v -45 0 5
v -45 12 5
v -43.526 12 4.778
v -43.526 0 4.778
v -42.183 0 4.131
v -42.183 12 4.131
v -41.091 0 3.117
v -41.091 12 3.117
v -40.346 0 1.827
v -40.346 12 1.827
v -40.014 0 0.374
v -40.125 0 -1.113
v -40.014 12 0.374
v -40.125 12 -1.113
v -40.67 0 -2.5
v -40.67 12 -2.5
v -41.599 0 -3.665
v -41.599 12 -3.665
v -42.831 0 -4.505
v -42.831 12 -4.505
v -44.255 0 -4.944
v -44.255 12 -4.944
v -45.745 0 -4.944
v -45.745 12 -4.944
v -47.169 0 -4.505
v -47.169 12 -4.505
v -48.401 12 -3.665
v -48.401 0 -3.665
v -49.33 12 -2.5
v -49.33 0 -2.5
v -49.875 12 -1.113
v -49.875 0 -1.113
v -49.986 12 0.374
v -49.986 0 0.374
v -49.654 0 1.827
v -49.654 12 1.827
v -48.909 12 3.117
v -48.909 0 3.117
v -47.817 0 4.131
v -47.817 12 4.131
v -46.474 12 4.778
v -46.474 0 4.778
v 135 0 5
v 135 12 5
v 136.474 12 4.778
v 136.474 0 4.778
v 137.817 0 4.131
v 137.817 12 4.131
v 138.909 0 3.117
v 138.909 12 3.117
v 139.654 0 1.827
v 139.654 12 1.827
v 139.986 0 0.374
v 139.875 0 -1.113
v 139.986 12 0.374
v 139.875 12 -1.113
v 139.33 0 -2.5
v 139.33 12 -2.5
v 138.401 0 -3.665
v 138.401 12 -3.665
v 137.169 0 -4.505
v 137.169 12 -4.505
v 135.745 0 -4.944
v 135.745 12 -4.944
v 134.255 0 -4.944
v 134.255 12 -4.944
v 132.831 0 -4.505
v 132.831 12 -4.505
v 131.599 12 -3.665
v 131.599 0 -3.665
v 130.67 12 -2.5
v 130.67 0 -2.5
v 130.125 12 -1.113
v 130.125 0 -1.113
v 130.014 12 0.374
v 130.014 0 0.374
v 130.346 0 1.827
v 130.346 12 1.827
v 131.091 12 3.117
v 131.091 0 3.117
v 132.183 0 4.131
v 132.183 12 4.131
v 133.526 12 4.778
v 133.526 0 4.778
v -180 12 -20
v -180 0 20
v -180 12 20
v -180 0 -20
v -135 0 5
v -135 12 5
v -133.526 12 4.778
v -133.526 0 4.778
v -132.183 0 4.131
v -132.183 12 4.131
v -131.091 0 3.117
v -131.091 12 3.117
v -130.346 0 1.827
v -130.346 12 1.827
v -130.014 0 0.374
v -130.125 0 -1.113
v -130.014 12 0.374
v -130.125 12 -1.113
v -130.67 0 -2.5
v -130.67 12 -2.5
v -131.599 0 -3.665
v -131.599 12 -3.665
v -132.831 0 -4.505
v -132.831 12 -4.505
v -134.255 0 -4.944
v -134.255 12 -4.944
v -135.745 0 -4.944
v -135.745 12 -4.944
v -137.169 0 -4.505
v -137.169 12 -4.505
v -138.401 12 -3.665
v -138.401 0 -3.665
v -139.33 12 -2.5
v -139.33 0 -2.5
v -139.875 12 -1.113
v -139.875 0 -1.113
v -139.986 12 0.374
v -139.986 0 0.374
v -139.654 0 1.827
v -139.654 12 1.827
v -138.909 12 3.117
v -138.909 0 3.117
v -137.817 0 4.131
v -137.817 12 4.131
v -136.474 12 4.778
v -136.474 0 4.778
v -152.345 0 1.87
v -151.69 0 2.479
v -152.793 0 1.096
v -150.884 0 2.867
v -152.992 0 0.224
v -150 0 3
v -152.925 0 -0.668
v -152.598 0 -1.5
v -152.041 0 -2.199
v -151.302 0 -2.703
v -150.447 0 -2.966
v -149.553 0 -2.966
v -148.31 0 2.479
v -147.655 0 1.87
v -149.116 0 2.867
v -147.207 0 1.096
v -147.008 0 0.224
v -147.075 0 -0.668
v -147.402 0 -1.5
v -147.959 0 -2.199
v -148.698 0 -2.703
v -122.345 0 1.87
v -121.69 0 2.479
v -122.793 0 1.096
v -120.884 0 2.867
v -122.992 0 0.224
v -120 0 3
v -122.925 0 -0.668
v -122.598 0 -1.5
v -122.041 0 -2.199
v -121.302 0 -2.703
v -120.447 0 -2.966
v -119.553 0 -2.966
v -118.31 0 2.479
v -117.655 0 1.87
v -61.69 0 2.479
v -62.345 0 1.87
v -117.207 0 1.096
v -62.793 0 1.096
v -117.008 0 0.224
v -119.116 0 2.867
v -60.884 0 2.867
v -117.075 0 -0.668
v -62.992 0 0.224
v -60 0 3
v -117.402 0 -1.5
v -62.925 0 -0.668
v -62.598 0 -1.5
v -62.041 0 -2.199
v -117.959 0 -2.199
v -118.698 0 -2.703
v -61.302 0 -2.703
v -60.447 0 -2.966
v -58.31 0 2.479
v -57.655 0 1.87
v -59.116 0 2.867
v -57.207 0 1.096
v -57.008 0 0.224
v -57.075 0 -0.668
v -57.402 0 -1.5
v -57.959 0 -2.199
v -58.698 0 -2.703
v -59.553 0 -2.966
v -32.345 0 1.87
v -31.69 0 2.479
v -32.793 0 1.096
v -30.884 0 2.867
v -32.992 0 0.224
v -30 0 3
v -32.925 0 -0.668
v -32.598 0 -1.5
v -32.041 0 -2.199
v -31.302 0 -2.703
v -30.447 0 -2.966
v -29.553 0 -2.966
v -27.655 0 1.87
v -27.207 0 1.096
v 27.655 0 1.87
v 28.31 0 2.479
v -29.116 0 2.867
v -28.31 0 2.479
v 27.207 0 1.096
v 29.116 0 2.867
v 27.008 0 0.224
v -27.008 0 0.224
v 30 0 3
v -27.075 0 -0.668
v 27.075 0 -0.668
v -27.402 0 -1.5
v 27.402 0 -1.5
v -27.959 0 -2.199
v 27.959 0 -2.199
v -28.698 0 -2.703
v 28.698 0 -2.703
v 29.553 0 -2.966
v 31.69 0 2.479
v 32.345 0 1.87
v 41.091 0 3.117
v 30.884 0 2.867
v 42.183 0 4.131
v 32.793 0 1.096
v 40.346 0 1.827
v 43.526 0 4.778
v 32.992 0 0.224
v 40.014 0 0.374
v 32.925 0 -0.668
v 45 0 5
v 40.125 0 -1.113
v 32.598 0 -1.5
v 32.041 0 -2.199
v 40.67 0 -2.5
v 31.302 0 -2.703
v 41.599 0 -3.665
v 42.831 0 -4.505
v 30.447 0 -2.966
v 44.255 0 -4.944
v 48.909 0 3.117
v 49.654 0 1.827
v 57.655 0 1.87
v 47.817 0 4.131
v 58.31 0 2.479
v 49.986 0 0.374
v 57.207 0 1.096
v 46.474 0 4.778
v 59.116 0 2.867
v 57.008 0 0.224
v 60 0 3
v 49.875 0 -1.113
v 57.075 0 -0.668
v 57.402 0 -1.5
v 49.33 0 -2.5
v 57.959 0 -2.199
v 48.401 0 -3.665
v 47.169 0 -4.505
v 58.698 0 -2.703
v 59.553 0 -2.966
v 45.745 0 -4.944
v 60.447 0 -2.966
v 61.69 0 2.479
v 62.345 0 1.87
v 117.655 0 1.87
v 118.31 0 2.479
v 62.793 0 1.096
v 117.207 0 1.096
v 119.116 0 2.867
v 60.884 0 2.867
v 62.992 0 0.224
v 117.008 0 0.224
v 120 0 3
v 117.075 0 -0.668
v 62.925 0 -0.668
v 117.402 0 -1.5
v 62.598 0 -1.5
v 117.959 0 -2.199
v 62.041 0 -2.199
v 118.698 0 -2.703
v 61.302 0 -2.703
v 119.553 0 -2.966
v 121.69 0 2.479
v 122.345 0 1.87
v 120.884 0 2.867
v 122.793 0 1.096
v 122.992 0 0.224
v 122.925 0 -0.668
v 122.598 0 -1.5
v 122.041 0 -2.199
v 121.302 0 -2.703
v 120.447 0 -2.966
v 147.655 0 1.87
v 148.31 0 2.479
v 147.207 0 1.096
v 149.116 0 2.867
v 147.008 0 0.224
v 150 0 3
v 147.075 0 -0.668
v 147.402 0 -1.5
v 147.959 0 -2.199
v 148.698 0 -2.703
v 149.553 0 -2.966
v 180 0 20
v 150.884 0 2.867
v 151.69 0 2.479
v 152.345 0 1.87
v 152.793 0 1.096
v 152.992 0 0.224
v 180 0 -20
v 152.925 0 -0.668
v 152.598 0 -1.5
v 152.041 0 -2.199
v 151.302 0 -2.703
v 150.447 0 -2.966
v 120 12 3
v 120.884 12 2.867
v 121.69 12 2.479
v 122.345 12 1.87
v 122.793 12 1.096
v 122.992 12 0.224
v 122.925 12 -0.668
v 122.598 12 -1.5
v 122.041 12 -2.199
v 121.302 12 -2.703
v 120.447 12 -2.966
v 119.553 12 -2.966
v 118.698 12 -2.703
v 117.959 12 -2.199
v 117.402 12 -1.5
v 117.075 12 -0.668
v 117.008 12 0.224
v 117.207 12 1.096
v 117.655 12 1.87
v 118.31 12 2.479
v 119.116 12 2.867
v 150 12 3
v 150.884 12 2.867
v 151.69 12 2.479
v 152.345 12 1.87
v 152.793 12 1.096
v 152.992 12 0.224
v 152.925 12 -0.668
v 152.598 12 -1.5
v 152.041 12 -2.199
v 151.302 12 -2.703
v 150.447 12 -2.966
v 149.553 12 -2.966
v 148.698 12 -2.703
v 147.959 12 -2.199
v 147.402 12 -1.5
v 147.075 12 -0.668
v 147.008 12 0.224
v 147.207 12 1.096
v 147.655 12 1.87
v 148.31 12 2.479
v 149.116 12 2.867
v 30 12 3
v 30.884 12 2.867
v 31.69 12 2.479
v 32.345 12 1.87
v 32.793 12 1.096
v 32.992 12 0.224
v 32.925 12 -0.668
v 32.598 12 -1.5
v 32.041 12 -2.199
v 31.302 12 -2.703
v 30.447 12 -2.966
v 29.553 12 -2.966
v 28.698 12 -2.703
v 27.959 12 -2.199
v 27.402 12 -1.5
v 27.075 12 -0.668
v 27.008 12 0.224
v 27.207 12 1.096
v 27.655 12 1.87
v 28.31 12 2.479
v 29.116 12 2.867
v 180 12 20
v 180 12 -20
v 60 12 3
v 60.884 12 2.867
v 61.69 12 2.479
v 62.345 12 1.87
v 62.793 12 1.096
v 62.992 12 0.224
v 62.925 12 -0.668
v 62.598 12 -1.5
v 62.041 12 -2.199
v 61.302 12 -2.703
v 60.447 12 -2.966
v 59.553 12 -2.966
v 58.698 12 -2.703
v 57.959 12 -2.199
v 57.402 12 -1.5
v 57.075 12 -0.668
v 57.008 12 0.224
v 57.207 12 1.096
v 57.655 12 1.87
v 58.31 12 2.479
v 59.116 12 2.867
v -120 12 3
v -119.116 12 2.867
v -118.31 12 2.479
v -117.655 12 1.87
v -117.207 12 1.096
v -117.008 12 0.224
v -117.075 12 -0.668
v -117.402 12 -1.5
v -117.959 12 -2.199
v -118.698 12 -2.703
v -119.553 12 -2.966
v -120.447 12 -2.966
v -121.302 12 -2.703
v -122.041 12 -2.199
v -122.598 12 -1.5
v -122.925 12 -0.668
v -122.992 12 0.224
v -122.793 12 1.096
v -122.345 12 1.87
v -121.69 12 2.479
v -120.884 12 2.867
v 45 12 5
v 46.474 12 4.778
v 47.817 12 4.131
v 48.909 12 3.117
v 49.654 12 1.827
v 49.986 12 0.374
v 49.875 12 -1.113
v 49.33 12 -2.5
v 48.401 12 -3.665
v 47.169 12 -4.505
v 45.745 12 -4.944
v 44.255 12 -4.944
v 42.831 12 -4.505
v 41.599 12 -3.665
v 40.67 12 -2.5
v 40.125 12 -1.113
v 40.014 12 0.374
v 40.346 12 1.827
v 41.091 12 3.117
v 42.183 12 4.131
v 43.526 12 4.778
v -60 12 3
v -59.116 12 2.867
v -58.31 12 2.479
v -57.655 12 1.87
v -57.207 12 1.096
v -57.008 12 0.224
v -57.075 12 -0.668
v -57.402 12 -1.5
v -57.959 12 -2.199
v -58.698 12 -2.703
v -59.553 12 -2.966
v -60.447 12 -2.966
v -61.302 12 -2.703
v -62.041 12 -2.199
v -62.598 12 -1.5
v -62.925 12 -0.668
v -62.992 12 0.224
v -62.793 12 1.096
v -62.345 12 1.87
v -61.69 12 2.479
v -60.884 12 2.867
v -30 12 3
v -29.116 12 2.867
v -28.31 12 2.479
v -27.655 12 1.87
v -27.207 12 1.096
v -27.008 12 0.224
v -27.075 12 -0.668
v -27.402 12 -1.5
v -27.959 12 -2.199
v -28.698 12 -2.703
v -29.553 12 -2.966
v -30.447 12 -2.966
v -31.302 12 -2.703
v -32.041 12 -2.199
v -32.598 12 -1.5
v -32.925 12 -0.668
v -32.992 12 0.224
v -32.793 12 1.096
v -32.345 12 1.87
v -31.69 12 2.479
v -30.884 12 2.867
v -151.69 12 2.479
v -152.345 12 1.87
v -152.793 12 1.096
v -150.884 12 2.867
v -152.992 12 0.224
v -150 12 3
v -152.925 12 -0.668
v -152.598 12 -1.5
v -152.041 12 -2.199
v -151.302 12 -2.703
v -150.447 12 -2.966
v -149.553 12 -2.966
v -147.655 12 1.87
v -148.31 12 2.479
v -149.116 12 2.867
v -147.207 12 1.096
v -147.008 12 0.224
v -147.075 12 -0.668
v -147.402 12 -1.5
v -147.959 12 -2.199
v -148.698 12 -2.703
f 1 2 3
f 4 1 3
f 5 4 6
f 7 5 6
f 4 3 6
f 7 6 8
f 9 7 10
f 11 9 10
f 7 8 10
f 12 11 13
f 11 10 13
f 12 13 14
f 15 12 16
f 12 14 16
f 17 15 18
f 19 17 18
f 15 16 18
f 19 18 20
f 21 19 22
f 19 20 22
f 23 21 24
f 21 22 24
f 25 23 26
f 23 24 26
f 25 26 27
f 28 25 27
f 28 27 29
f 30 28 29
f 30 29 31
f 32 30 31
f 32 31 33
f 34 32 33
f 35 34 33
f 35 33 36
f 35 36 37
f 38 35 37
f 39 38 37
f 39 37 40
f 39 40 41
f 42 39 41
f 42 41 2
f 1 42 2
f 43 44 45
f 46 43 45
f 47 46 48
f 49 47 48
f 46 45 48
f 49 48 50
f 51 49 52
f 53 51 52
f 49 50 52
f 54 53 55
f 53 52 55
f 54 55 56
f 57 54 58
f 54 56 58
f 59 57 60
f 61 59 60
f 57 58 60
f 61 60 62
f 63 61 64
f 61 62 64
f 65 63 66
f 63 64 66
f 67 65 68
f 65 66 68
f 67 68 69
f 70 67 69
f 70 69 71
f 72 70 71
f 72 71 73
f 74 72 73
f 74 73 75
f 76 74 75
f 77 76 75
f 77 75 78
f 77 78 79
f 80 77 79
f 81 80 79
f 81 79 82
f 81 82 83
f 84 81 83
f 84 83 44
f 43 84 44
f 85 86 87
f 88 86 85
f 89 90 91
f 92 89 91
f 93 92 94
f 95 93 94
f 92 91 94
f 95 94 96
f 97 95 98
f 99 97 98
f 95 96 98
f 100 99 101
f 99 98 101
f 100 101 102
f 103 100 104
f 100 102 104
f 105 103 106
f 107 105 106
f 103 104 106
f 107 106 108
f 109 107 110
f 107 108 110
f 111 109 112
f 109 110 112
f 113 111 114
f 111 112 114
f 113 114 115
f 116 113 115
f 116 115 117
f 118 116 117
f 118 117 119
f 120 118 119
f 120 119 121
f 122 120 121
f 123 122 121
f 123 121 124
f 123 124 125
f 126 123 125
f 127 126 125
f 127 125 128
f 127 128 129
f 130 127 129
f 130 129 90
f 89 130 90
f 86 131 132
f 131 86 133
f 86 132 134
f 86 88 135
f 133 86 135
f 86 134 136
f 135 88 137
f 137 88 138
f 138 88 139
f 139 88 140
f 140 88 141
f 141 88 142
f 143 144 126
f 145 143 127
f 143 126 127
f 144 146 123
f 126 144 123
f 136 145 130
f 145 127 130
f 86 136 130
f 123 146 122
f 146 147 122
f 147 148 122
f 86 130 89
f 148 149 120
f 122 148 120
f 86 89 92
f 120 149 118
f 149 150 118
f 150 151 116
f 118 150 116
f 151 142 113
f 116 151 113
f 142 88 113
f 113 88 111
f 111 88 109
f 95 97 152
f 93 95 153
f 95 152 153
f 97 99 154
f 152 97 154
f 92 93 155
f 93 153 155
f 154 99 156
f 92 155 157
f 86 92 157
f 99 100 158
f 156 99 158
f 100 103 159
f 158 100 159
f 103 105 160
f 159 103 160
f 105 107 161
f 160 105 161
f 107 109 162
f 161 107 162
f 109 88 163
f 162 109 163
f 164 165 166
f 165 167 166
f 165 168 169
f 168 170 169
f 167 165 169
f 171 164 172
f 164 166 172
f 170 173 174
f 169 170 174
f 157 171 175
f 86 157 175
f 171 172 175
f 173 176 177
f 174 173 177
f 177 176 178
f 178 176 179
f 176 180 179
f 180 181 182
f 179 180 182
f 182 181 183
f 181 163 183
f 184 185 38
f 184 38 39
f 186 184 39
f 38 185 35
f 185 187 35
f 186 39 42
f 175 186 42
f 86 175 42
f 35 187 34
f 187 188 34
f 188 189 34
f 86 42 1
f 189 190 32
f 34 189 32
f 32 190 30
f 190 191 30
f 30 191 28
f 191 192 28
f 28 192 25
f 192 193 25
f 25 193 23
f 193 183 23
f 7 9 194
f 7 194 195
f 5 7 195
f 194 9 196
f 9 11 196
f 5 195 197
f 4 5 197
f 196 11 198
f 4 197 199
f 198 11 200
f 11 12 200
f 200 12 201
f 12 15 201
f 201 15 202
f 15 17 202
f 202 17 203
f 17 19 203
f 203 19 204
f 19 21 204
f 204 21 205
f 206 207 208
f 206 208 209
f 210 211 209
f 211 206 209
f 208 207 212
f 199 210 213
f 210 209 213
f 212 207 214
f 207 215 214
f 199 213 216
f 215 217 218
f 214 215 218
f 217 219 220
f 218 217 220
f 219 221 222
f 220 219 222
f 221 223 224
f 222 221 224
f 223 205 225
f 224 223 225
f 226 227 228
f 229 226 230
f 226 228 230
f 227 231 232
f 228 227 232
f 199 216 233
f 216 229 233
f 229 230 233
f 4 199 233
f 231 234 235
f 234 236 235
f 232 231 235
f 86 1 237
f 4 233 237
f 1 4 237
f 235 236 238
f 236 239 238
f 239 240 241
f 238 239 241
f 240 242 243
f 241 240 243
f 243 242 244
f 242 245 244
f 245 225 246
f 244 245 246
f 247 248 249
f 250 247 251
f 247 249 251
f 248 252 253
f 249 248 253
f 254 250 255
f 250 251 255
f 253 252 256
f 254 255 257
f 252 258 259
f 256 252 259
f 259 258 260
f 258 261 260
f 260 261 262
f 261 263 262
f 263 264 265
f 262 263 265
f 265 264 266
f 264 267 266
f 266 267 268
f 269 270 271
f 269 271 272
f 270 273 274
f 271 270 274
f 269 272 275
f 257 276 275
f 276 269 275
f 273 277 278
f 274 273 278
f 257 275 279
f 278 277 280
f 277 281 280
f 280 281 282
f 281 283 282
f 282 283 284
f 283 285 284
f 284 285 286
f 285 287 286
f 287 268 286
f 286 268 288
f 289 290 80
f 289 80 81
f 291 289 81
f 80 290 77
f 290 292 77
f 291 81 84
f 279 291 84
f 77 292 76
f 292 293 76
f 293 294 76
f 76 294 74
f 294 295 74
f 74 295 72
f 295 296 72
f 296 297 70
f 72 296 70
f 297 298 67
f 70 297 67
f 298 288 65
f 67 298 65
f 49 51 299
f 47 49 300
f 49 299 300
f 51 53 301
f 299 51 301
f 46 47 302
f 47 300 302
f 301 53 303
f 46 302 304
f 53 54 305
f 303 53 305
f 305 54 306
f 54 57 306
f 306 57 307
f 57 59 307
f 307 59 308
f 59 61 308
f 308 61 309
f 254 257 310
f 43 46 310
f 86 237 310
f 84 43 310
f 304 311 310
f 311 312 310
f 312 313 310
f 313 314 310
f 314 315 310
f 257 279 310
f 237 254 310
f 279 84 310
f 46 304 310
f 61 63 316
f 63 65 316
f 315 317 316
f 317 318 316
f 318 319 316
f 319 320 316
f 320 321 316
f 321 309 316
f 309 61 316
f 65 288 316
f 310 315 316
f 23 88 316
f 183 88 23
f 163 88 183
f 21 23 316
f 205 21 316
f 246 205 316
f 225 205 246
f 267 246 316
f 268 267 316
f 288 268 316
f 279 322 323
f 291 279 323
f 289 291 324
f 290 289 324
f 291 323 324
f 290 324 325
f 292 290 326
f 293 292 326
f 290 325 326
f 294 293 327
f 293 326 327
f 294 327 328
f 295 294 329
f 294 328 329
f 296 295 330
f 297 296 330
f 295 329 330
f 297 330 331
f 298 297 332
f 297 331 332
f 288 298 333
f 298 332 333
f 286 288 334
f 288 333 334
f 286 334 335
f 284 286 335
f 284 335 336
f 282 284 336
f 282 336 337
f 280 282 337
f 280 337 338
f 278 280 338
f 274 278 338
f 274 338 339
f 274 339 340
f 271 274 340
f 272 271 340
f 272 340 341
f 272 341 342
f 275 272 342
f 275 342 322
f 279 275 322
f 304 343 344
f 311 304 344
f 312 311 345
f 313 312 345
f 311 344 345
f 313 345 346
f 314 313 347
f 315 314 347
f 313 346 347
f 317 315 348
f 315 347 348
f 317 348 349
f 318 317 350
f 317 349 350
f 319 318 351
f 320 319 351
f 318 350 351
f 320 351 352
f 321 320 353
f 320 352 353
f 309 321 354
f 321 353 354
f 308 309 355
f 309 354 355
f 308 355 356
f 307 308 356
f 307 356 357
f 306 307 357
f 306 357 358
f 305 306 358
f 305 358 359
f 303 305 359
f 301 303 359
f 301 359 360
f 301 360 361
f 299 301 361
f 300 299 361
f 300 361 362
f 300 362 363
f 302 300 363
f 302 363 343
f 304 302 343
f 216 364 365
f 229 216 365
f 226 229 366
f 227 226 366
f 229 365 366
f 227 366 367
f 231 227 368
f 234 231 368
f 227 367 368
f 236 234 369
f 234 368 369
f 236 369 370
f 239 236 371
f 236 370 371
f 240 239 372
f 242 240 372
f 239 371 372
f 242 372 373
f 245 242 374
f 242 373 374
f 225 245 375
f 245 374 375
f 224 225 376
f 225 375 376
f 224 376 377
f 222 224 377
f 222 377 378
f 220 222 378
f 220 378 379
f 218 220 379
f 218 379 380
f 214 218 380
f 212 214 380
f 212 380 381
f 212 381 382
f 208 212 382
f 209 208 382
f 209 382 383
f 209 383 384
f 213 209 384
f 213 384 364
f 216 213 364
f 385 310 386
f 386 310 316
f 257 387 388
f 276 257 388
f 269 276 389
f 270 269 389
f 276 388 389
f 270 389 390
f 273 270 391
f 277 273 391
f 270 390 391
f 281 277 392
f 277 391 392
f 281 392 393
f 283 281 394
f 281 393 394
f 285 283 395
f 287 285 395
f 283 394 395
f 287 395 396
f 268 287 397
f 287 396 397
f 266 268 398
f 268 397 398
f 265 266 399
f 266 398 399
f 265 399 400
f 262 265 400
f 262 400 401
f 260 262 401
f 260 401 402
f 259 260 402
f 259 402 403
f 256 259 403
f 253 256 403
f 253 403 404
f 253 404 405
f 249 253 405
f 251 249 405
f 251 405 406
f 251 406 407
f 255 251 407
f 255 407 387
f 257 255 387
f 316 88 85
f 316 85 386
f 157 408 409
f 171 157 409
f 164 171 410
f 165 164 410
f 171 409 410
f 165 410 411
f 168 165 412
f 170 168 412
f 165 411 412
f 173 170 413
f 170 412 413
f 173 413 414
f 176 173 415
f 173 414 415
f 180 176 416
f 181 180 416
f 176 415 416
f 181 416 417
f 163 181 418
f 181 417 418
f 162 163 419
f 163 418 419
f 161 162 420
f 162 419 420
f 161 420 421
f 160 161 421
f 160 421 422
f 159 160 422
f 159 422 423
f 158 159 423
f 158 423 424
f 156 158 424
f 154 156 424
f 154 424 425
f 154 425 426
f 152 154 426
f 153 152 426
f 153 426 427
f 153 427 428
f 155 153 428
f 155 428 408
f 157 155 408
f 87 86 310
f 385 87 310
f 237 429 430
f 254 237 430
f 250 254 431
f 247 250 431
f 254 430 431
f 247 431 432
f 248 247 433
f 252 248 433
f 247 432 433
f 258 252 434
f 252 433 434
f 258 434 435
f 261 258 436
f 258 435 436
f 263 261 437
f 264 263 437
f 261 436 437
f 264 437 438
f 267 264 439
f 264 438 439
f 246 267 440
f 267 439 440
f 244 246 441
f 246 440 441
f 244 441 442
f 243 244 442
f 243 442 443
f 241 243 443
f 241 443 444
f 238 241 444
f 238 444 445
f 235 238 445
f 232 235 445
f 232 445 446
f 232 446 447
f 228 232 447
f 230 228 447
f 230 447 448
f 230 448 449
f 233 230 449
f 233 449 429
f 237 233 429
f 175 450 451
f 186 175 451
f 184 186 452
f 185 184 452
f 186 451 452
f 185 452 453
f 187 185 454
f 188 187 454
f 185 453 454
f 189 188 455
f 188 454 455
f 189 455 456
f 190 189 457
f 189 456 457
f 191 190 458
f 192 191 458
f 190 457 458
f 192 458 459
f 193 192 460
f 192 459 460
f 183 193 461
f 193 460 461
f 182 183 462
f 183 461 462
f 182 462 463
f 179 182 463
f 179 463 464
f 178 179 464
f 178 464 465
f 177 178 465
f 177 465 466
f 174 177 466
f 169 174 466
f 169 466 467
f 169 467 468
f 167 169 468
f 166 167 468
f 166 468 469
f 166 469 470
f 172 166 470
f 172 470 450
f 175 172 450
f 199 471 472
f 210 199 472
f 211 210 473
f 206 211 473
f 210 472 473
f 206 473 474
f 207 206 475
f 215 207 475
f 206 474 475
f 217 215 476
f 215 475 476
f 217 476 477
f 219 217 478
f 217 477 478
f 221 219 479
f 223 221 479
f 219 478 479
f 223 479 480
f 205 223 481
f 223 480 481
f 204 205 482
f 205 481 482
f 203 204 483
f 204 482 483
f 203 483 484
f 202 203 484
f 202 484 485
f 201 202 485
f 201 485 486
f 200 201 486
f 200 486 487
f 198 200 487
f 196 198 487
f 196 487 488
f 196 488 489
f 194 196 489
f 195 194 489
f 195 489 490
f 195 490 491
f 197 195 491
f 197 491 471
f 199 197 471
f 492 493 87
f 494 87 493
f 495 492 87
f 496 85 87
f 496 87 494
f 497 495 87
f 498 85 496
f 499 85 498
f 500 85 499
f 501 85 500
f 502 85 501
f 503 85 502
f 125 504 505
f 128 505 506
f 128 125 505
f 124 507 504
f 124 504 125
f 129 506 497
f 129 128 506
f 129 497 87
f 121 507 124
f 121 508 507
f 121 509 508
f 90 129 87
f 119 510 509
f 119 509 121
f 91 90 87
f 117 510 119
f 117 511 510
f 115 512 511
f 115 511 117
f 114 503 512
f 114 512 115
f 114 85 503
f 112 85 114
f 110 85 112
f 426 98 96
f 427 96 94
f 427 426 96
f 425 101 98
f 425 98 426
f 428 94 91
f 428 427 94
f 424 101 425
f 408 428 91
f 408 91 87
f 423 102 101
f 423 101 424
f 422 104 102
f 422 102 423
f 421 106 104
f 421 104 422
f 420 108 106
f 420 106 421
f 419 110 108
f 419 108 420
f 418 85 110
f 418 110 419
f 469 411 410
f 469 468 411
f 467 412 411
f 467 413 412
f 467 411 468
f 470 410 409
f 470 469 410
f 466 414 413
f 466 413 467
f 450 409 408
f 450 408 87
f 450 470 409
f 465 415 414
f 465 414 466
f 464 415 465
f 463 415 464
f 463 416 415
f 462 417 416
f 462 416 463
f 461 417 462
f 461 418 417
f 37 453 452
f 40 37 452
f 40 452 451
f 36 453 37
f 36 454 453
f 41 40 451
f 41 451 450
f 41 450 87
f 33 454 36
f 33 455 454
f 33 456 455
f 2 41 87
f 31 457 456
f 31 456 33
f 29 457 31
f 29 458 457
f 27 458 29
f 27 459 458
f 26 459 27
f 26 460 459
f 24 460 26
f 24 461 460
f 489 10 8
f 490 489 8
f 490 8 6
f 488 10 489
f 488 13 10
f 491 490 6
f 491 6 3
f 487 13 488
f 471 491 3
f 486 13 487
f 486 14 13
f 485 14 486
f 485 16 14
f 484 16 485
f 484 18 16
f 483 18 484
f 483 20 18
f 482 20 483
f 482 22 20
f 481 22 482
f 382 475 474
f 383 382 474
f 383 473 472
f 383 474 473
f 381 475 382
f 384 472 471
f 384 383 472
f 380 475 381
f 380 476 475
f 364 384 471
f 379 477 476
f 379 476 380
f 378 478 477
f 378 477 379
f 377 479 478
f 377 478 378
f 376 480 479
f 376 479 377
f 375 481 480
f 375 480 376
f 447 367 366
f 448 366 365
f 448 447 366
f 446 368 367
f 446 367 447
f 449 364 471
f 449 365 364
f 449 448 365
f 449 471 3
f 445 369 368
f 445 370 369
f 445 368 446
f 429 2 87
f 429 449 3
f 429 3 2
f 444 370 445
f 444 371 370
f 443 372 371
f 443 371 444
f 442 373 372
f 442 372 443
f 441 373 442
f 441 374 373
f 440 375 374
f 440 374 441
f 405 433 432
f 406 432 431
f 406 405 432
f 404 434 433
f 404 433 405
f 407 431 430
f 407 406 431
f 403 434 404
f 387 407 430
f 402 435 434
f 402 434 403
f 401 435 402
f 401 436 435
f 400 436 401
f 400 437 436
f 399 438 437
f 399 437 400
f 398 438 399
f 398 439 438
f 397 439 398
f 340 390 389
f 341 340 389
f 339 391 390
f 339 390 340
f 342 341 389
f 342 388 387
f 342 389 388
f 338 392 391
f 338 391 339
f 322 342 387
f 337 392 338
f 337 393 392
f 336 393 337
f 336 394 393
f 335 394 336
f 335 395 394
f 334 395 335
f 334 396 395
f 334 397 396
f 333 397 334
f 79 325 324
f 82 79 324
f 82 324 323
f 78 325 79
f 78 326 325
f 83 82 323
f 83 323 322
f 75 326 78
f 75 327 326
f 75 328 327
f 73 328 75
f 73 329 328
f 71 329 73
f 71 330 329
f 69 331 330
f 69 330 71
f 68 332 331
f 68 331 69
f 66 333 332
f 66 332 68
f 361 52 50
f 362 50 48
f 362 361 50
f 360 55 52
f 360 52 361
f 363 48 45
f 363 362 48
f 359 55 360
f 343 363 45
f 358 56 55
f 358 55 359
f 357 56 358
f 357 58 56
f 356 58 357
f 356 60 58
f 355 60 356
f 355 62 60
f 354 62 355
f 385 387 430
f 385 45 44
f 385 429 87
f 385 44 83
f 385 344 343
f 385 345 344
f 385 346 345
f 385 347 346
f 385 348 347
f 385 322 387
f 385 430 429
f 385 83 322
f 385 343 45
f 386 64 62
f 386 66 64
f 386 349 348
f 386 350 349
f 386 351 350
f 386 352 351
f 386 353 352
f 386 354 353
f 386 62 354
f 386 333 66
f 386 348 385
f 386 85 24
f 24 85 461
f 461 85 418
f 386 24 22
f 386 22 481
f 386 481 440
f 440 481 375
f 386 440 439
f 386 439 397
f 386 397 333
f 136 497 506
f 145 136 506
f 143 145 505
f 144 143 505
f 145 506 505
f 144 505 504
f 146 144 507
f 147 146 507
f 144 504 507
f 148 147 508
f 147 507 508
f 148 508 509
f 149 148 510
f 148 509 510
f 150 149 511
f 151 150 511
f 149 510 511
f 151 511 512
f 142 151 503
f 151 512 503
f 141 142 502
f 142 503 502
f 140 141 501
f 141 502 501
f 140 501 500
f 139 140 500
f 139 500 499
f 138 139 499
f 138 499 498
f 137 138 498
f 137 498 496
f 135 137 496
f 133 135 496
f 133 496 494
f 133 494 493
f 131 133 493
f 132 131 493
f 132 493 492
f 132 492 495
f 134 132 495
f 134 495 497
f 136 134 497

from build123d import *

# Parameters (mm, degrees)
SKETCH1_W           = 360
SKETCH1_H           = 40
BOSS_EXTRUDE1_DEPTH = 12
CUT_EXTRUDE1_REACH  = 183.505
SKETCH2_R           = 3
SKETCH2_R_2         = 5
LPATTERN1_COUNT     = 4
LPATTERN1_PITCH     = 90


with BuildPart() as part:
    # Sketch1 → Boss-Extrude1 (new body)
    with BuildSketch(Plane(origin=(0, 0, 0), x_dir=(1, 0, 0), z_dir=(0, 1, 0))):
        Rectangle(SKETCH1_W, SKETCH1_H)
    extrude(amount=BOSS_EXTRUDE1_DEPTH)

    # Sketch2 → Cut-Extrude1 (cut, up to next)
    with BuildSketch(Plane(origin=(0, 12, 0), x_dir=(1, 0, 0), z_dir=(0, 1, 0)), mode=Mode.PRIVATE) as cut_extrude1_sk1:
        with Locations(Location((-150, 0, 0), (0, 0, 270))):
            Circle(SKETCH2_R)
    cut_extrude1_tool1 = extrude(cut_extrude1_sk1.sketch, amount=-CUT_EXTRUDE1_REACH, mode=Mode.PRIVATE) & part.part
    # Sketch2 → Cut-Extrude1 (cut, up to next)
    with BuildSketch(Plane(origin=(0, 12, 0), x_dir=(1, 0, 0), z_dir=(0, 1, 0)), mode=Mode.PRIVATE) as cut_extrude1_sk2:
        with Locations(Location((-120, 0, 0), (0, 0, 270))):
            Circle(SKETCH2_R)
    cut_extrude1_tool2 = extrude(cut_extrude1_sk2.sketch, amount=-CUT_EXTRUDE1_REACH, mode=Mode.PRIVATE) & part.part
    # Sketch2 → Cut-Extrude1 (cut, up to next)
    with BuildSketch(Plane(origin=(0, 12, 0), x_dir=(1, 0, 0), z_dir=(0, 1, 0)), mode=Mode.PRIVATE) as cut_extrude1_sk3:
        with Locations(Location((-135, 0, 0), (0, 0, 270))):
            Circle(SKETCH2_R_2)
    cut_extrude1_tool3 = extrude(cut_extrude1_sk3.sketch, amount=-CUT_EXTRUDE1_REACH, mode=Mode.PRIVATE) & part.part
    cut_extrude1_1 = cut_extrude1_tool1.solids().sort_by_distance((-150, 12, 0))[0]
    add(cut_extrude1_1, mode=Mode.SUBTRACT)
    cut_extrude1_2 = cut_extrude1_tool2.solids().sort_by_distance((-120, 12, 0))[0]
    add(cut_extrude1_2, mode=Mode.SUBTRACT)
    cut_extrude1_3 = cut_extrude1_tool3.solids().sort_by_distance((-135, 12, 0))[0]
    add(cut_extrude1_3, mode=Mode.SUBTRACT)
    cut_extrude1 = cut_extrude1_1 + cut_extrude1_2 + cut_extrude1_3  # Cut-Extrude1 as one shape, for the pattern or mirror that repeats it

    # LPattern1: Cut-Extrude1 ×4
    with Locations(*[(i * LPATTERN1_PITCH, 0, 0) for i in range(1, LPATTERN1_COUNT)]):
        add(cut_extrude1, mode=Mode.SUBTRACT)


solid = part.part
